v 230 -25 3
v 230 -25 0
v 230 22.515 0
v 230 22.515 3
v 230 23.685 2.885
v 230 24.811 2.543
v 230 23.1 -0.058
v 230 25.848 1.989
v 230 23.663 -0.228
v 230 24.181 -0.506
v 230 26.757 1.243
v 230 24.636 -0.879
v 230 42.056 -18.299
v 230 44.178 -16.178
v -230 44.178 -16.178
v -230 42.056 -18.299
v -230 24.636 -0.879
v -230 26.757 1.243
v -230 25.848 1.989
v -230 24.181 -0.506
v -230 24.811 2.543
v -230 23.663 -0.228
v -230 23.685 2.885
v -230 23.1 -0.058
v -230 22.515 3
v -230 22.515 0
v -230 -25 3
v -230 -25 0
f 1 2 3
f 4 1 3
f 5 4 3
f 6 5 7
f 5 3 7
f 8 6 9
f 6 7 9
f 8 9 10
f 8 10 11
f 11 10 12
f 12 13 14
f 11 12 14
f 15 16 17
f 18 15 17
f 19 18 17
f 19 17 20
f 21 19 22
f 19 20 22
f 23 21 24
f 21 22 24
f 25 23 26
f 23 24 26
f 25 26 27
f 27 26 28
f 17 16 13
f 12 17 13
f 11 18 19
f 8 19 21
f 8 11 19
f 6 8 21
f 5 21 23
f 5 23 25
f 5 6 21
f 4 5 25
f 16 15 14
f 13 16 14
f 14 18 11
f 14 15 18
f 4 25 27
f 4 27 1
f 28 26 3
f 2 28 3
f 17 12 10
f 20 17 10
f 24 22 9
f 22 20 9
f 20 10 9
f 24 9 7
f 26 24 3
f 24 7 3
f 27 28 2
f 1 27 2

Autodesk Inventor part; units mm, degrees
ref_plane "YZ Plane" through (0, 0, 0) normal (1, 0, 0) x (0, 1, 0)
ref_plane "XZ Plane" through (0, 0, 0) normal (0, 1, 0) x (-1, 0, 0)
sketch "Sketch3" plane through (230, 25, 3) normal (0, 0.7071068, 0.7071068) x (1, 0, 0)
  line L0 (0, 0) -> (-460, 0)
  line L1 (-460, 0) -> (-460, 27.12132)
  line L2 (-460, 27.12132) -> (0, 27.12132)
  line L3 (0, 27.12132) -> (0, 0)
  line L4 (0, 2.12132) -> (-460, 2.12132)
  line L5 (-460, -35.355339) -> (-460, 0)
  point P0 (-230, -15.556349)
  dimension "d4" = 25
  dimension "d5" = 0
sketch "Sketch1 outline for Plate1" plane through (0, 0, 0) normal (0, 0, 1) x (1, 0, 0)
  line L0 (-230, 25) -> (-230, -25)
  line L1 (230, 25) -> (-230, 25)
  line L2 (230, -25) -> (230, 25)
  line L3 (-230, -25) -> (230, -25)
extrude "Plate1" add sketch "Sketch1 outline for Plate1" along normal blind 3
sketch "Sketch1" plane through (0, 0, 0) normal (0, 0, 1) x (1, 0, 0)
  line L0 (-230, -25) -> (230, -25)
  line L1 (230, -25) -> (230, 25)
  line L2 (230, 25) -> (-230, 25)
  line L3 (-230, 25) -> (-230, -25)
  line L4 (-230, -25) -> (230, 25) construction
  line L5 (230, -25) -> (-230, 25) construction
  point P0 (0, 0)
  dimension "d0" = 460
  dimension "d1" = 50
ref_plane "Work Plane1" through (230, 25, 3) normal (0, 0.7071068, 0.7071068) x (1, 0, 0)
sketch "Sketch3 outline for Plate2" plane through (230, 25, 3) normal (0, 0.7071068, 0.7071068) x (1, 0, 0)
  line L0 (0, 0) -> (-460, 0)
  line L1 (-460, 0) -> (-460, 27.12132)
  line L2 (-460, 27.12132) -> (0, 27.12132)
  line L3 (0, 27.12132) -> (0, 2.12132)
  line L4 (0, 2.12132) -> (0, 0)
sheet face with bend "Face2" sketch "Sketch3 outline for Plate2" thickness 3 toward (0, -0.7071068, -0.7071068) bend radius 3
bend "Bend1"
equation "\"d2\" = Thickness"
equation "\"d6\" = BendRadius"
equation "\"d7\" = BendReliefWidth"
equation "\"d9\" = MinimumRemnant"
equation "\"d8\" = BendReliefDepth"
equation "\"d10\" = TransitionRadius"
equation "\"BendRadius\" = Thickness"
equation "\"BendReliefWidth\" = Thickness"
equation "\"BendReliefDepth\" = 0.5 * Thickness"
equation "\"CornerReliefSize\" = 4 * Thickness"
equation "\"MinimumRemnant\" = 2 * Thickness"
equation "\"TransitionRadius\" = BendRadius"
equation "\"JacobiRadiusSize\" = BendRadius"
equation "\"GapSize\" = Thickness"
equation "\"Thickness\" = 3"
properties part number "Skena"
